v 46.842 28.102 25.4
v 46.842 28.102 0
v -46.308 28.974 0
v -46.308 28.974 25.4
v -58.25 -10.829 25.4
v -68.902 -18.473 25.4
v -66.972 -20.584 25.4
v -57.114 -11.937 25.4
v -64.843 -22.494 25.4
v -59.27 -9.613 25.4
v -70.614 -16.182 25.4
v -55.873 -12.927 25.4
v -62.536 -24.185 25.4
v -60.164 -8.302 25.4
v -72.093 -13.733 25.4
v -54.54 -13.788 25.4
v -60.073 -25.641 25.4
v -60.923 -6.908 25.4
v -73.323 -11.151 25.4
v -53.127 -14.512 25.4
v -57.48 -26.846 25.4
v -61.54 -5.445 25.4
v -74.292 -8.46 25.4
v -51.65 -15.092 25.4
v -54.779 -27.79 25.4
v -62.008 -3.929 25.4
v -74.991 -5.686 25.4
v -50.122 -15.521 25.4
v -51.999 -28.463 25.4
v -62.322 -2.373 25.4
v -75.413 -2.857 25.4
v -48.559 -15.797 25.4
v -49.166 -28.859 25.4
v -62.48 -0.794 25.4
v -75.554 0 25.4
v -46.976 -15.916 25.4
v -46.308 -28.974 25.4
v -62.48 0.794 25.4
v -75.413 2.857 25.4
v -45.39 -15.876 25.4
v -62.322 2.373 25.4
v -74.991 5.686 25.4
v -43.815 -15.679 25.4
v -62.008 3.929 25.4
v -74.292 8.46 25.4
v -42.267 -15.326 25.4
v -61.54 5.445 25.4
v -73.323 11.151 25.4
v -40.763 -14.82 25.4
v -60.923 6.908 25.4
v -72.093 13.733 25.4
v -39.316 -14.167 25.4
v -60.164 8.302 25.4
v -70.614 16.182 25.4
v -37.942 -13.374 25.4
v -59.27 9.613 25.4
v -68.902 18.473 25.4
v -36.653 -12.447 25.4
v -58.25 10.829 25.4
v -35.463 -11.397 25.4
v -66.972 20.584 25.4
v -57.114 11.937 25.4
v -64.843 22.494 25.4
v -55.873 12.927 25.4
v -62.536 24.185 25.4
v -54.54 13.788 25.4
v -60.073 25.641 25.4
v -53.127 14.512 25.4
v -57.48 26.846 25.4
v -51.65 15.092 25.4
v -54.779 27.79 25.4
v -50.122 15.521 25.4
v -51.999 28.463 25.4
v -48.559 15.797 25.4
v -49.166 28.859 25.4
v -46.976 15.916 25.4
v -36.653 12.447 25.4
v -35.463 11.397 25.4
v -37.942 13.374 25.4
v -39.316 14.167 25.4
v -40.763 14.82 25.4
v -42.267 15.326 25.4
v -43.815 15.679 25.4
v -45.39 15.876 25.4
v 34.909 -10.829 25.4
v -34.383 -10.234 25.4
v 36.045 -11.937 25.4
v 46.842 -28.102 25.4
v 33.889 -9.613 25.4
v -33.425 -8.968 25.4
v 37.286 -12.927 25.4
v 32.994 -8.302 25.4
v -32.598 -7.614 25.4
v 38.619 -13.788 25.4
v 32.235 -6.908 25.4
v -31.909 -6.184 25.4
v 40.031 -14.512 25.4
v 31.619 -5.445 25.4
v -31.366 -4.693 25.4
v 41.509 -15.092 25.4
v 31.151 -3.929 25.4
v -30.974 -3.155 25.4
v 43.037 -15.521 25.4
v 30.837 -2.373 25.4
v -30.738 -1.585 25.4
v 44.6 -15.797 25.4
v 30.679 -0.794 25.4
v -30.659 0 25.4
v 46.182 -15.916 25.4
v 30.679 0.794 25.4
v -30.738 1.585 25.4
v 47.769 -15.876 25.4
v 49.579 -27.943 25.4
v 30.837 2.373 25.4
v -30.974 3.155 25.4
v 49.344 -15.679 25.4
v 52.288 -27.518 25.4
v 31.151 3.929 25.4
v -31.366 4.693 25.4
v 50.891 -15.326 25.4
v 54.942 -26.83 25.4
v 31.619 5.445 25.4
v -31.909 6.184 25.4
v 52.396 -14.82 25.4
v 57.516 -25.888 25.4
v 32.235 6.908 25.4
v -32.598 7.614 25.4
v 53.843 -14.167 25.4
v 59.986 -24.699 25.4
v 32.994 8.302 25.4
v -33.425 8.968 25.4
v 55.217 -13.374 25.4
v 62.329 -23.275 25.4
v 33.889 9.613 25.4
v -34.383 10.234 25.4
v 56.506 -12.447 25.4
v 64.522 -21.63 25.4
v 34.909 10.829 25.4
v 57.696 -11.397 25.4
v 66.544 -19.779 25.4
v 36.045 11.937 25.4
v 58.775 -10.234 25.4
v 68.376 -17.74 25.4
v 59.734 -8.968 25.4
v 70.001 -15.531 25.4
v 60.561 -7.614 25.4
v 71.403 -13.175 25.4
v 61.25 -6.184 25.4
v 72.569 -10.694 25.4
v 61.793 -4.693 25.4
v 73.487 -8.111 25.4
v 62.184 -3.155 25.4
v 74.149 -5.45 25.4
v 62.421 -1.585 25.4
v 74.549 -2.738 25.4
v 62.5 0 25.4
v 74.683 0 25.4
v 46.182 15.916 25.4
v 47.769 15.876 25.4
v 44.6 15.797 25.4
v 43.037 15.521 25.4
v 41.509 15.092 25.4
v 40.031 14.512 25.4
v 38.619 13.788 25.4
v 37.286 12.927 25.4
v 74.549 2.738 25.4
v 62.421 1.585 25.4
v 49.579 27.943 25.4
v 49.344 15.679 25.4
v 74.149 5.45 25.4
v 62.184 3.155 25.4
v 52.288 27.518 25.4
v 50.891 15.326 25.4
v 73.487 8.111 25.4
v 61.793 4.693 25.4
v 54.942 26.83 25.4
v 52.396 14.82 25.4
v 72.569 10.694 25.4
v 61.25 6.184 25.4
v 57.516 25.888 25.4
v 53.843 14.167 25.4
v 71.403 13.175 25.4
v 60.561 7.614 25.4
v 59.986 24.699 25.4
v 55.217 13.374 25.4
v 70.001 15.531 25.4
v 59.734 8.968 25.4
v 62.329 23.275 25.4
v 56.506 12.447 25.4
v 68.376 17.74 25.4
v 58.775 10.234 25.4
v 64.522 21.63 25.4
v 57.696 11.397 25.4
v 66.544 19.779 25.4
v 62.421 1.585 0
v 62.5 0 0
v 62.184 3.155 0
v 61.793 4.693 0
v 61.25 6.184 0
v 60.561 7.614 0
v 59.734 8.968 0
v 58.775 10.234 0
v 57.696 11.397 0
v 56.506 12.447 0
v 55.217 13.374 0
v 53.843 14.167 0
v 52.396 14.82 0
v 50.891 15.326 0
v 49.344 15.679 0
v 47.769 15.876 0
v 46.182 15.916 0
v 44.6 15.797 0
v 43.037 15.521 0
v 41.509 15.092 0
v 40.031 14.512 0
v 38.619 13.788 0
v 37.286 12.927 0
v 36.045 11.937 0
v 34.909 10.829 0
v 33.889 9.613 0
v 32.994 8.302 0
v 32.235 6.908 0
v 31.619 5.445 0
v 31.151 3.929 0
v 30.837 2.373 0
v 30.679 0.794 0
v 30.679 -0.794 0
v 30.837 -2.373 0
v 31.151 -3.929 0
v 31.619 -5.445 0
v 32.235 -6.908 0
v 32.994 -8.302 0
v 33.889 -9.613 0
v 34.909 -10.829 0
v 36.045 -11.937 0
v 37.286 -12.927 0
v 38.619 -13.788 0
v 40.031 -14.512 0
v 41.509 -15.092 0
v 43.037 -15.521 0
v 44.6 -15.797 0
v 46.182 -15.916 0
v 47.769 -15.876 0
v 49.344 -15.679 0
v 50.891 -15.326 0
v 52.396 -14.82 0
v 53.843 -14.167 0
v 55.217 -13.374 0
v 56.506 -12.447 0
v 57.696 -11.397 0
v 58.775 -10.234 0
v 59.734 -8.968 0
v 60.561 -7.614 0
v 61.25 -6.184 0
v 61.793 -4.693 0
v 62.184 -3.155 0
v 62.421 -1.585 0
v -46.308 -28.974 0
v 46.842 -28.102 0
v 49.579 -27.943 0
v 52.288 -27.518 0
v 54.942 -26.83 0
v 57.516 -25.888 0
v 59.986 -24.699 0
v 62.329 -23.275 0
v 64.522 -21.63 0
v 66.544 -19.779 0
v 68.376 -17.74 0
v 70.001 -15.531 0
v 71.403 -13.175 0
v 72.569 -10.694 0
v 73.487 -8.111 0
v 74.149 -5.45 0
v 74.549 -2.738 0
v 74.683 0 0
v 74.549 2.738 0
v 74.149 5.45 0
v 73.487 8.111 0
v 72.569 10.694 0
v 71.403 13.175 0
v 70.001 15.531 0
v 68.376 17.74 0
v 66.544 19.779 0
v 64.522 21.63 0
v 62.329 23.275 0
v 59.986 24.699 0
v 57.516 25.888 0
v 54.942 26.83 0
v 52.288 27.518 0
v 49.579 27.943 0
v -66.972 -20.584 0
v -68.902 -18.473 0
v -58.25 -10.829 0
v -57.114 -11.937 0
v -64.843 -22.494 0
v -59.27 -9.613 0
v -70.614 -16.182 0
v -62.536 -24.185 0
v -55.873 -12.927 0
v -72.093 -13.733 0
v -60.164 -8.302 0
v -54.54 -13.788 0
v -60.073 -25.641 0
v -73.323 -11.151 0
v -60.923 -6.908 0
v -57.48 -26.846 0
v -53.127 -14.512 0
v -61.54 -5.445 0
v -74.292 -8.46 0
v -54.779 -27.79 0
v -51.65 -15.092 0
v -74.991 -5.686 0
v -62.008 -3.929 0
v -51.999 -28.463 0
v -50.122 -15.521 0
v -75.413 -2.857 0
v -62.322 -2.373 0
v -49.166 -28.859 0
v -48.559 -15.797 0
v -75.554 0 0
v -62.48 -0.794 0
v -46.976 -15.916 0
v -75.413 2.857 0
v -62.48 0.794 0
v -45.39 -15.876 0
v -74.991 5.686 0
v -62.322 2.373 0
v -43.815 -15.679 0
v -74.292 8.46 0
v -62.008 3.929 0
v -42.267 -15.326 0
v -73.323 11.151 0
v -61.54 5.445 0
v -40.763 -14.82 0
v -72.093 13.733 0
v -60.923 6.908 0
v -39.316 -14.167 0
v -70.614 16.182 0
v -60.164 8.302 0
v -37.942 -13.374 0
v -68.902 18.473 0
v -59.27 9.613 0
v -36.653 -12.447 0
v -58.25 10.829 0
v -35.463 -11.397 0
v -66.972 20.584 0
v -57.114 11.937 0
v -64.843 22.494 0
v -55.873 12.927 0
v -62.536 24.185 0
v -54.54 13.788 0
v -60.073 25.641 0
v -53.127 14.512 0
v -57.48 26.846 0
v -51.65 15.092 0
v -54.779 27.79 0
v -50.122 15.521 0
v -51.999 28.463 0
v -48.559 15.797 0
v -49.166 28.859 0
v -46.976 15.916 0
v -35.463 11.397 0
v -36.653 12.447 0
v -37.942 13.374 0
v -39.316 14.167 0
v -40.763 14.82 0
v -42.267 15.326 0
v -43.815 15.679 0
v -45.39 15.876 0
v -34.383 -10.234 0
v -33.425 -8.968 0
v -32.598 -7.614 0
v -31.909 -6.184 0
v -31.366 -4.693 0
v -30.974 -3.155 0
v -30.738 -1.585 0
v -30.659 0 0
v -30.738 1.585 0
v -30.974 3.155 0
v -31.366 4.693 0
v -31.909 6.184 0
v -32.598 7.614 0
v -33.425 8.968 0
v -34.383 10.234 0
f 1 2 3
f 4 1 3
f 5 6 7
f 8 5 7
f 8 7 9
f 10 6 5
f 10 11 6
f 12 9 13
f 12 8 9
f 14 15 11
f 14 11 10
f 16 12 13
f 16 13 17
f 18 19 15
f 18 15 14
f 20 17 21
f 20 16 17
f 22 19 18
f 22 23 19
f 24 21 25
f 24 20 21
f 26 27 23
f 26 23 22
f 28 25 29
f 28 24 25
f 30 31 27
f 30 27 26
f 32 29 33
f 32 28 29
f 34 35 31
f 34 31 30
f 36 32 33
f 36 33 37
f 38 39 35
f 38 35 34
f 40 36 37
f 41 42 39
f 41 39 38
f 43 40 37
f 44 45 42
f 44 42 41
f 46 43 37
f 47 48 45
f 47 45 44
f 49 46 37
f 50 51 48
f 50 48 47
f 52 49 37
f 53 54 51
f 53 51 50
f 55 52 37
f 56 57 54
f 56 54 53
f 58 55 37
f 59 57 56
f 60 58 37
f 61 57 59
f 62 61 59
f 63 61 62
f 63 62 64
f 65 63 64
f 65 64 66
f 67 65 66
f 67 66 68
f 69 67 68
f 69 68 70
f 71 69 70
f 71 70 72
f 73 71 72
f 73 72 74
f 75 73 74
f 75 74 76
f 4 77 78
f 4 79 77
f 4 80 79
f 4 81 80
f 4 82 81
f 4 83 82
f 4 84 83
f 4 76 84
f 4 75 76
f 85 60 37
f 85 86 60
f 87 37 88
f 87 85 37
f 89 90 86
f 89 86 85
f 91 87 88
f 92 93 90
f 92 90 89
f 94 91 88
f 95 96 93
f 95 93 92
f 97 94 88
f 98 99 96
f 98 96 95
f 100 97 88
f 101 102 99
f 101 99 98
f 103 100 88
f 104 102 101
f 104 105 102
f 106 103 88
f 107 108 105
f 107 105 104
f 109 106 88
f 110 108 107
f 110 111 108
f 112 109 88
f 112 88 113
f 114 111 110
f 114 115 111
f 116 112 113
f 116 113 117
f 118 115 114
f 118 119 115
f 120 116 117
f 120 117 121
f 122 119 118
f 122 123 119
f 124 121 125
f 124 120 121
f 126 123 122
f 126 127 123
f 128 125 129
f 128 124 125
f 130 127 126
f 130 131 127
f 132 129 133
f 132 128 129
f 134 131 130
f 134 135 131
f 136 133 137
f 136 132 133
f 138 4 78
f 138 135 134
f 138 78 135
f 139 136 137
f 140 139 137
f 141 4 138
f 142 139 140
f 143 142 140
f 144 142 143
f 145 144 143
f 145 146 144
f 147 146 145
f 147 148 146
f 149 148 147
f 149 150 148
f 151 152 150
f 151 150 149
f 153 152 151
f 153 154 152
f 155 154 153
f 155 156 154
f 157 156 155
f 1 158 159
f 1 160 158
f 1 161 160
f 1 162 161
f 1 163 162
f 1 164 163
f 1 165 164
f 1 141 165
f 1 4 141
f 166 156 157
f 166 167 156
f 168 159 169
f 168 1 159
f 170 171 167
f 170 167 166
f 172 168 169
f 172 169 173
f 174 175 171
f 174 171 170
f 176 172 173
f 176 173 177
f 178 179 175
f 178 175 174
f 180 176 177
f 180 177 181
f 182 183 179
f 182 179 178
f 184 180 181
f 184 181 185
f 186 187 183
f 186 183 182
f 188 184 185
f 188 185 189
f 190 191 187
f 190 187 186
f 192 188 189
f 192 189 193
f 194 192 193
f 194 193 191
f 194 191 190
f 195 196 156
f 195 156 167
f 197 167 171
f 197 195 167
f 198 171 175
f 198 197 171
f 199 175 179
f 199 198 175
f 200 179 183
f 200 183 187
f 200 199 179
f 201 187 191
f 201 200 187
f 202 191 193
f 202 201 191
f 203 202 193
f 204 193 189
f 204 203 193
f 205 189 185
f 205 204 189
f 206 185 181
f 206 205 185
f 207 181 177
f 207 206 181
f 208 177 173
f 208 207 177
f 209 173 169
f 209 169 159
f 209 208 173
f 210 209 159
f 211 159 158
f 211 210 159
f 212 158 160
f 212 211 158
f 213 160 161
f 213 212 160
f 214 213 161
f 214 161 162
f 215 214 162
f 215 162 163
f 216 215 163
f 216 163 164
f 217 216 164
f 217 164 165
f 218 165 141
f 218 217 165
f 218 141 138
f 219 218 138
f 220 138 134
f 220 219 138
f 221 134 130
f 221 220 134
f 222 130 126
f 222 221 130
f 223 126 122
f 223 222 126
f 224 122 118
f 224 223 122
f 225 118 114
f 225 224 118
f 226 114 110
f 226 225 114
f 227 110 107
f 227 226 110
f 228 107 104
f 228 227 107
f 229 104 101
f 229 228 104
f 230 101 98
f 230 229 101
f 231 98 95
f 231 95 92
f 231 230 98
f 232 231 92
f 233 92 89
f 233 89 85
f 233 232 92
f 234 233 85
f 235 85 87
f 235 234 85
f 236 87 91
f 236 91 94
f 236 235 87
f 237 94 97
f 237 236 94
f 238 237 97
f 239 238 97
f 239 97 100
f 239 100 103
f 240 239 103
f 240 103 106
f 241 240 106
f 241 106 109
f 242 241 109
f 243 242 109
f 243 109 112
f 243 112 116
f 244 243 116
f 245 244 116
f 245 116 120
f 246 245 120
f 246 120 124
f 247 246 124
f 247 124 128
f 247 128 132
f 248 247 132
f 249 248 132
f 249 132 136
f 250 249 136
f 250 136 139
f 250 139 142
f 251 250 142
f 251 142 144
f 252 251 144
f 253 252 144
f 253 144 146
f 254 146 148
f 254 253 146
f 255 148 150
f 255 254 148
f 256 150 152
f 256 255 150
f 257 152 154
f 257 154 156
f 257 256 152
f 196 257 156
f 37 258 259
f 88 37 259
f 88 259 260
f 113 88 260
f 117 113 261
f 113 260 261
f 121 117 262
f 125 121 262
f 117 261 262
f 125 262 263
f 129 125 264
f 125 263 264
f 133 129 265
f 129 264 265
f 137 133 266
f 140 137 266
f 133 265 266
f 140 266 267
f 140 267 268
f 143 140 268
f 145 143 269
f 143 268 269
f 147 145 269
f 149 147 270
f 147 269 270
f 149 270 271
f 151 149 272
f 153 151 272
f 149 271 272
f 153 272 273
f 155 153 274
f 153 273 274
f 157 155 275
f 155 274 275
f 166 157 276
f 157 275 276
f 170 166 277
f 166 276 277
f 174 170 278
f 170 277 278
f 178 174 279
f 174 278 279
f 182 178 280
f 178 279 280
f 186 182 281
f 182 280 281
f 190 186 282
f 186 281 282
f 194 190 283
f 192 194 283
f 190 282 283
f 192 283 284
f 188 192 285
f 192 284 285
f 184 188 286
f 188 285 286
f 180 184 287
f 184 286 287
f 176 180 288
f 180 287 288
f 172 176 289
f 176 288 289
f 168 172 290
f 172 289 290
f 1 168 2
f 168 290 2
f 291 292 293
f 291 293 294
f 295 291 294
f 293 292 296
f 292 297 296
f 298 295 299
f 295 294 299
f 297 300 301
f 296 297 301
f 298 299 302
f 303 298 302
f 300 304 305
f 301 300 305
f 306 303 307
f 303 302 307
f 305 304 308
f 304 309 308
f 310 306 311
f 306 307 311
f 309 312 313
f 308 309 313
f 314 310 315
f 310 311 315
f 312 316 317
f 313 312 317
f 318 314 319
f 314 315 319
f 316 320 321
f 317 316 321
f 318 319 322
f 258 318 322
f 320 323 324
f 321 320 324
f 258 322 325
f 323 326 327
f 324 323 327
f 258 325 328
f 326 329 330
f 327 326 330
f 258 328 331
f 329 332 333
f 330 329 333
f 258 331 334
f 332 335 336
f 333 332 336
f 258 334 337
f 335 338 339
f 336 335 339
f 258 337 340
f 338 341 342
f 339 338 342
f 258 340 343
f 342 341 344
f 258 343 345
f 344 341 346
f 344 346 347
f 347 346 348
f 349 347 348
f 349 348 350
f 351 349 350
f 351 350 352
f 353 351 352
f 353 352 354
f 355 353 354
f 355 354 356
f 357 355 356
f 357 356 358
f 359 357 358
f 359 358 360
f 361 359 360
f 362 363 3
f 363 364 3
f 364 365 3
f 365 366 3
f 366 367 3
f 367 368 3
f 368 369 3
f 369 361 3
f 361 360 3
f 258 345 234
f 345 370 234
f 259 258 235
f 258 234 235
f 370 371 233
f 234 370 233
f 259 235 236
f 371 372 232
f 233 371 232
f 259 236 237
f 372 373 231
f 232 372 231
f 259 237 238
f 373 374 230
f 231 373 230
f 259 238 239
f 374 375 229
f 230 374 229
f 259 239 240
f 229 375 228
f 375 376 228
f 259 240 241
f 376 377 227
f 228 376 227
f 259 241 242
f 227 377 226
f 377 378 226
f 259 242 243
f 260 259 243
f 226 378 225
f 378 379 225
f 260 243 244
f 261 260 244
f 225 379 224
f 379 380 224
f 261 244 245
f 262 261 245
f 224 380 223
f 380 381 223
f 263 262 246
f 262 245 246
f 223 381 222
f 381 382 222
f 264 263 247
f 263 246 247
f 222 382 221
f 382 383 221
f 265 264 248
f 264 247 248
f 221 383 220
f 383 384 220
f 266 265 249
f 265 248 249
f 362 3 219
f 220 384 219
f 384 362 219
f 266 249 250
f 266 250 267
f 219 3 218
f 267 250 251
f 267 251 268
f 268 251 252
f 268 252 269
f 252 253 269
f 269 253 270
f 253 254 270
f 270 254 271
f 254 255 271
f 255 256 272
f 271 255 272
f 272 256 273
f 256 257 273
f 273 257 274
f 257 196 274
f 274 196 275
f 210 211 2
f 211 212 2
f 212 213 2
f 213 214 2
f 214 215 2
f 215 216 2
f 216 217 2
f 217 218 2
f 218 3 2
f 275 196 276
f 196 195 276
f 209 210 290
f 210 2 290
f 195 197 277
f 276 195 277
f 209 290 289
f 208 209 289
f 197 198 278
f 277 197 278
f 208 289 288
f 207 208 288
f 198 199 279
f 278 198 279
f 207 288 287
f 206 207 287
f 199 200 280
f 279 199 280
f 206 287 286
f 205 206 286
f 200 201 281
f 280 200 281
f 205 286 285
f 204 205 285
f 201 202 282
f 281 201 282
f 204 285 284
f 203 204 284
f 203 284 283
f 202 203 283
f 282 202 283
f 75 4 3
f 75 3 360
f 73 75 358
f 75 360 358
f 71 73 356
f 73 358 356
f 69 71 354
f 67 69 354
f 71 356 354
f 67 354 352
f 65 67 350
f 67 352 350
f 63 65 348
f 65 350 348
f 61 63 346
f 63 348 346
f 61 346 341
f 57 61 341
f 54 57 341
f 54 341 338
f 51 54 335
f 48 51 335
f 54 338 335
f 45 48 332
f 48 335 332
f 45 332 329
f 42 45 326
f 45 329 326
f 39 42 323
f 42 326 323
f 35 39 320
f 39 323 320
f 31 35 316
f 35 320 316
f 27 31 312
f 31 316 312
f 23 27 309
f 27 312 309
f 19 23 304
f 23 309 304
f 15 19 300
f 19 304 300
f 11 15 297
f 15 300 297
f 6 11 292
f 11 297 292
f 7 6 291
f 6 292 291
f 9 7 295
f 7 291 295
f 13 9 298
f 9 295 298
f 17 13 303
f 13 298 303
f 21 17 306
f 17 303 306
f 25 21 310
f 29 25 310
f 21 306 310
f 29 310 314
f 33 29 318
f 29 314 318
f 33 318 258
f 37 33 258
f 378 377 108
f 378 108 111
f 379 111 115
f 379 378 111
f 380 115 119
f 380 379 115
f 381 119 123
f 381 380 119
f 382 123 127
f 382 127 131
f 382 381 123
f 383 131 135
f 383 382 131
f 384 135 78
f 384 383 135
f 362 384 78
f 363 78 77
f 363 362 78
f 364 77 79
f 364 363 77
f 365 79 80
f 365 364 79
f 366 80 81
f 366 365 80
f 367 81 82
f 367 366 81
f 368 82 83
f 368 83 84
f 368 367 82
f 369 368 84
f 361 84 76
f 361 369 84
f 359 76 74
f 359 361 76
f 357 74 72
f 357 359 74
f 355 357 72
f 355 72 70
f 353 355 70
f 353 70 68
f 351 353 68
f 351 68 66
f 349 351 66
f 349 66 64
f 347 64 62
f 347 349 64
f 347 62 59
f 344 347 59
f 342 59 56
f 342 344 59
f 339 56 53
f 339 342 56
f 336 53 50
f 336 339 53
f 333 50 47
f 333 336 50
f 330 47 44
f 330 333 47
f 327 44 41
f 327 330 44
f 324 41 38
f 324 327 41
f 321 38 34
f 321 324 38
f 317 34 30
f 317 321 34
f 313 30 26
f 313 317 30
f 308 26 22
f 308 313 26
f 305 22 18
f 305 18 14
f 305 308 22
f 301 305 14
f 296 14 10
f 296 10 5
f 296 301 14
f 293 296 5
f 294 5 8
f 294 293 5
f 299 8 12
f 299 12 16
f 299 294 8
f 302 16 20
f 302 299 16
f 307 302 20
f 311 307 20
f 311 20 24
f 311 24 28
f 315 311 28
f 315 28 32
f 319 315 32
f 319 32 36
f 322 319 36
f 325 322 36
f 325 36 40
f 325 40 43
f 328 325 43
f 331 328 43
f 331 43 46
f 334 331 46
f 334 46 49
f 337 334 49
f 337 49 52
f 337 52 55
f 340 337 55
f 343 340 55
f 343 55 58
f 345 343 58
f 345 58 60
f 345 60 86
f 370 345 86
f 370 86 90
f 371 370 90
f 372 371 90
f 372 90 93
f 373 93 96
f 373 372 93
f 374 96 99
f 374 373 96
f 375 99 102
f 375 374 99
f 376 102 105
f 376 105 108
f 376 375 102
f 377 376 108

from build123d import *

# Parameters (mm, degrees)
F0_R     = 15.920661
F1_DEPTH = 25.4


with BuildPart() as f1:
    # F0 (on Top) → F1 (new body)
    with BuildSketch(Plane.XY):
        with BuildLine():
            ThreePointArc((-46.308367, -28.973528), (-17.604609, 0), (-46.308367, 28.973528))
            ThreePointArc((-46.308367, 28.973528), (-75.554202, 0), (-46.308367, -28.973528))
        make_face()
        with Locations((-46.579406, 0)):
            Circle(F0_R, mode=Mode.SUBTRACT)
        with BuildLine():
            Line((46.842293, 28.102132), (-46.308367, 28.973528))
            ThreePointArc((-46.308367, 28.973528), (-17.604609, 0), (-46.308367, -28.973528))
            Line((-46.308367, -28.973528), (46.842293, -28.102132))
            ThreePointArc((46.842293, -28.102132), (74.682768, 0), (46.842293, 28.102132))
        make_face()
        with Locations((46.579406, 0)):
            Circle(F0_R, mode=Mode.SUBTRACT)
    extrude(amount=F1_DEPTH)


solid = f1.part
